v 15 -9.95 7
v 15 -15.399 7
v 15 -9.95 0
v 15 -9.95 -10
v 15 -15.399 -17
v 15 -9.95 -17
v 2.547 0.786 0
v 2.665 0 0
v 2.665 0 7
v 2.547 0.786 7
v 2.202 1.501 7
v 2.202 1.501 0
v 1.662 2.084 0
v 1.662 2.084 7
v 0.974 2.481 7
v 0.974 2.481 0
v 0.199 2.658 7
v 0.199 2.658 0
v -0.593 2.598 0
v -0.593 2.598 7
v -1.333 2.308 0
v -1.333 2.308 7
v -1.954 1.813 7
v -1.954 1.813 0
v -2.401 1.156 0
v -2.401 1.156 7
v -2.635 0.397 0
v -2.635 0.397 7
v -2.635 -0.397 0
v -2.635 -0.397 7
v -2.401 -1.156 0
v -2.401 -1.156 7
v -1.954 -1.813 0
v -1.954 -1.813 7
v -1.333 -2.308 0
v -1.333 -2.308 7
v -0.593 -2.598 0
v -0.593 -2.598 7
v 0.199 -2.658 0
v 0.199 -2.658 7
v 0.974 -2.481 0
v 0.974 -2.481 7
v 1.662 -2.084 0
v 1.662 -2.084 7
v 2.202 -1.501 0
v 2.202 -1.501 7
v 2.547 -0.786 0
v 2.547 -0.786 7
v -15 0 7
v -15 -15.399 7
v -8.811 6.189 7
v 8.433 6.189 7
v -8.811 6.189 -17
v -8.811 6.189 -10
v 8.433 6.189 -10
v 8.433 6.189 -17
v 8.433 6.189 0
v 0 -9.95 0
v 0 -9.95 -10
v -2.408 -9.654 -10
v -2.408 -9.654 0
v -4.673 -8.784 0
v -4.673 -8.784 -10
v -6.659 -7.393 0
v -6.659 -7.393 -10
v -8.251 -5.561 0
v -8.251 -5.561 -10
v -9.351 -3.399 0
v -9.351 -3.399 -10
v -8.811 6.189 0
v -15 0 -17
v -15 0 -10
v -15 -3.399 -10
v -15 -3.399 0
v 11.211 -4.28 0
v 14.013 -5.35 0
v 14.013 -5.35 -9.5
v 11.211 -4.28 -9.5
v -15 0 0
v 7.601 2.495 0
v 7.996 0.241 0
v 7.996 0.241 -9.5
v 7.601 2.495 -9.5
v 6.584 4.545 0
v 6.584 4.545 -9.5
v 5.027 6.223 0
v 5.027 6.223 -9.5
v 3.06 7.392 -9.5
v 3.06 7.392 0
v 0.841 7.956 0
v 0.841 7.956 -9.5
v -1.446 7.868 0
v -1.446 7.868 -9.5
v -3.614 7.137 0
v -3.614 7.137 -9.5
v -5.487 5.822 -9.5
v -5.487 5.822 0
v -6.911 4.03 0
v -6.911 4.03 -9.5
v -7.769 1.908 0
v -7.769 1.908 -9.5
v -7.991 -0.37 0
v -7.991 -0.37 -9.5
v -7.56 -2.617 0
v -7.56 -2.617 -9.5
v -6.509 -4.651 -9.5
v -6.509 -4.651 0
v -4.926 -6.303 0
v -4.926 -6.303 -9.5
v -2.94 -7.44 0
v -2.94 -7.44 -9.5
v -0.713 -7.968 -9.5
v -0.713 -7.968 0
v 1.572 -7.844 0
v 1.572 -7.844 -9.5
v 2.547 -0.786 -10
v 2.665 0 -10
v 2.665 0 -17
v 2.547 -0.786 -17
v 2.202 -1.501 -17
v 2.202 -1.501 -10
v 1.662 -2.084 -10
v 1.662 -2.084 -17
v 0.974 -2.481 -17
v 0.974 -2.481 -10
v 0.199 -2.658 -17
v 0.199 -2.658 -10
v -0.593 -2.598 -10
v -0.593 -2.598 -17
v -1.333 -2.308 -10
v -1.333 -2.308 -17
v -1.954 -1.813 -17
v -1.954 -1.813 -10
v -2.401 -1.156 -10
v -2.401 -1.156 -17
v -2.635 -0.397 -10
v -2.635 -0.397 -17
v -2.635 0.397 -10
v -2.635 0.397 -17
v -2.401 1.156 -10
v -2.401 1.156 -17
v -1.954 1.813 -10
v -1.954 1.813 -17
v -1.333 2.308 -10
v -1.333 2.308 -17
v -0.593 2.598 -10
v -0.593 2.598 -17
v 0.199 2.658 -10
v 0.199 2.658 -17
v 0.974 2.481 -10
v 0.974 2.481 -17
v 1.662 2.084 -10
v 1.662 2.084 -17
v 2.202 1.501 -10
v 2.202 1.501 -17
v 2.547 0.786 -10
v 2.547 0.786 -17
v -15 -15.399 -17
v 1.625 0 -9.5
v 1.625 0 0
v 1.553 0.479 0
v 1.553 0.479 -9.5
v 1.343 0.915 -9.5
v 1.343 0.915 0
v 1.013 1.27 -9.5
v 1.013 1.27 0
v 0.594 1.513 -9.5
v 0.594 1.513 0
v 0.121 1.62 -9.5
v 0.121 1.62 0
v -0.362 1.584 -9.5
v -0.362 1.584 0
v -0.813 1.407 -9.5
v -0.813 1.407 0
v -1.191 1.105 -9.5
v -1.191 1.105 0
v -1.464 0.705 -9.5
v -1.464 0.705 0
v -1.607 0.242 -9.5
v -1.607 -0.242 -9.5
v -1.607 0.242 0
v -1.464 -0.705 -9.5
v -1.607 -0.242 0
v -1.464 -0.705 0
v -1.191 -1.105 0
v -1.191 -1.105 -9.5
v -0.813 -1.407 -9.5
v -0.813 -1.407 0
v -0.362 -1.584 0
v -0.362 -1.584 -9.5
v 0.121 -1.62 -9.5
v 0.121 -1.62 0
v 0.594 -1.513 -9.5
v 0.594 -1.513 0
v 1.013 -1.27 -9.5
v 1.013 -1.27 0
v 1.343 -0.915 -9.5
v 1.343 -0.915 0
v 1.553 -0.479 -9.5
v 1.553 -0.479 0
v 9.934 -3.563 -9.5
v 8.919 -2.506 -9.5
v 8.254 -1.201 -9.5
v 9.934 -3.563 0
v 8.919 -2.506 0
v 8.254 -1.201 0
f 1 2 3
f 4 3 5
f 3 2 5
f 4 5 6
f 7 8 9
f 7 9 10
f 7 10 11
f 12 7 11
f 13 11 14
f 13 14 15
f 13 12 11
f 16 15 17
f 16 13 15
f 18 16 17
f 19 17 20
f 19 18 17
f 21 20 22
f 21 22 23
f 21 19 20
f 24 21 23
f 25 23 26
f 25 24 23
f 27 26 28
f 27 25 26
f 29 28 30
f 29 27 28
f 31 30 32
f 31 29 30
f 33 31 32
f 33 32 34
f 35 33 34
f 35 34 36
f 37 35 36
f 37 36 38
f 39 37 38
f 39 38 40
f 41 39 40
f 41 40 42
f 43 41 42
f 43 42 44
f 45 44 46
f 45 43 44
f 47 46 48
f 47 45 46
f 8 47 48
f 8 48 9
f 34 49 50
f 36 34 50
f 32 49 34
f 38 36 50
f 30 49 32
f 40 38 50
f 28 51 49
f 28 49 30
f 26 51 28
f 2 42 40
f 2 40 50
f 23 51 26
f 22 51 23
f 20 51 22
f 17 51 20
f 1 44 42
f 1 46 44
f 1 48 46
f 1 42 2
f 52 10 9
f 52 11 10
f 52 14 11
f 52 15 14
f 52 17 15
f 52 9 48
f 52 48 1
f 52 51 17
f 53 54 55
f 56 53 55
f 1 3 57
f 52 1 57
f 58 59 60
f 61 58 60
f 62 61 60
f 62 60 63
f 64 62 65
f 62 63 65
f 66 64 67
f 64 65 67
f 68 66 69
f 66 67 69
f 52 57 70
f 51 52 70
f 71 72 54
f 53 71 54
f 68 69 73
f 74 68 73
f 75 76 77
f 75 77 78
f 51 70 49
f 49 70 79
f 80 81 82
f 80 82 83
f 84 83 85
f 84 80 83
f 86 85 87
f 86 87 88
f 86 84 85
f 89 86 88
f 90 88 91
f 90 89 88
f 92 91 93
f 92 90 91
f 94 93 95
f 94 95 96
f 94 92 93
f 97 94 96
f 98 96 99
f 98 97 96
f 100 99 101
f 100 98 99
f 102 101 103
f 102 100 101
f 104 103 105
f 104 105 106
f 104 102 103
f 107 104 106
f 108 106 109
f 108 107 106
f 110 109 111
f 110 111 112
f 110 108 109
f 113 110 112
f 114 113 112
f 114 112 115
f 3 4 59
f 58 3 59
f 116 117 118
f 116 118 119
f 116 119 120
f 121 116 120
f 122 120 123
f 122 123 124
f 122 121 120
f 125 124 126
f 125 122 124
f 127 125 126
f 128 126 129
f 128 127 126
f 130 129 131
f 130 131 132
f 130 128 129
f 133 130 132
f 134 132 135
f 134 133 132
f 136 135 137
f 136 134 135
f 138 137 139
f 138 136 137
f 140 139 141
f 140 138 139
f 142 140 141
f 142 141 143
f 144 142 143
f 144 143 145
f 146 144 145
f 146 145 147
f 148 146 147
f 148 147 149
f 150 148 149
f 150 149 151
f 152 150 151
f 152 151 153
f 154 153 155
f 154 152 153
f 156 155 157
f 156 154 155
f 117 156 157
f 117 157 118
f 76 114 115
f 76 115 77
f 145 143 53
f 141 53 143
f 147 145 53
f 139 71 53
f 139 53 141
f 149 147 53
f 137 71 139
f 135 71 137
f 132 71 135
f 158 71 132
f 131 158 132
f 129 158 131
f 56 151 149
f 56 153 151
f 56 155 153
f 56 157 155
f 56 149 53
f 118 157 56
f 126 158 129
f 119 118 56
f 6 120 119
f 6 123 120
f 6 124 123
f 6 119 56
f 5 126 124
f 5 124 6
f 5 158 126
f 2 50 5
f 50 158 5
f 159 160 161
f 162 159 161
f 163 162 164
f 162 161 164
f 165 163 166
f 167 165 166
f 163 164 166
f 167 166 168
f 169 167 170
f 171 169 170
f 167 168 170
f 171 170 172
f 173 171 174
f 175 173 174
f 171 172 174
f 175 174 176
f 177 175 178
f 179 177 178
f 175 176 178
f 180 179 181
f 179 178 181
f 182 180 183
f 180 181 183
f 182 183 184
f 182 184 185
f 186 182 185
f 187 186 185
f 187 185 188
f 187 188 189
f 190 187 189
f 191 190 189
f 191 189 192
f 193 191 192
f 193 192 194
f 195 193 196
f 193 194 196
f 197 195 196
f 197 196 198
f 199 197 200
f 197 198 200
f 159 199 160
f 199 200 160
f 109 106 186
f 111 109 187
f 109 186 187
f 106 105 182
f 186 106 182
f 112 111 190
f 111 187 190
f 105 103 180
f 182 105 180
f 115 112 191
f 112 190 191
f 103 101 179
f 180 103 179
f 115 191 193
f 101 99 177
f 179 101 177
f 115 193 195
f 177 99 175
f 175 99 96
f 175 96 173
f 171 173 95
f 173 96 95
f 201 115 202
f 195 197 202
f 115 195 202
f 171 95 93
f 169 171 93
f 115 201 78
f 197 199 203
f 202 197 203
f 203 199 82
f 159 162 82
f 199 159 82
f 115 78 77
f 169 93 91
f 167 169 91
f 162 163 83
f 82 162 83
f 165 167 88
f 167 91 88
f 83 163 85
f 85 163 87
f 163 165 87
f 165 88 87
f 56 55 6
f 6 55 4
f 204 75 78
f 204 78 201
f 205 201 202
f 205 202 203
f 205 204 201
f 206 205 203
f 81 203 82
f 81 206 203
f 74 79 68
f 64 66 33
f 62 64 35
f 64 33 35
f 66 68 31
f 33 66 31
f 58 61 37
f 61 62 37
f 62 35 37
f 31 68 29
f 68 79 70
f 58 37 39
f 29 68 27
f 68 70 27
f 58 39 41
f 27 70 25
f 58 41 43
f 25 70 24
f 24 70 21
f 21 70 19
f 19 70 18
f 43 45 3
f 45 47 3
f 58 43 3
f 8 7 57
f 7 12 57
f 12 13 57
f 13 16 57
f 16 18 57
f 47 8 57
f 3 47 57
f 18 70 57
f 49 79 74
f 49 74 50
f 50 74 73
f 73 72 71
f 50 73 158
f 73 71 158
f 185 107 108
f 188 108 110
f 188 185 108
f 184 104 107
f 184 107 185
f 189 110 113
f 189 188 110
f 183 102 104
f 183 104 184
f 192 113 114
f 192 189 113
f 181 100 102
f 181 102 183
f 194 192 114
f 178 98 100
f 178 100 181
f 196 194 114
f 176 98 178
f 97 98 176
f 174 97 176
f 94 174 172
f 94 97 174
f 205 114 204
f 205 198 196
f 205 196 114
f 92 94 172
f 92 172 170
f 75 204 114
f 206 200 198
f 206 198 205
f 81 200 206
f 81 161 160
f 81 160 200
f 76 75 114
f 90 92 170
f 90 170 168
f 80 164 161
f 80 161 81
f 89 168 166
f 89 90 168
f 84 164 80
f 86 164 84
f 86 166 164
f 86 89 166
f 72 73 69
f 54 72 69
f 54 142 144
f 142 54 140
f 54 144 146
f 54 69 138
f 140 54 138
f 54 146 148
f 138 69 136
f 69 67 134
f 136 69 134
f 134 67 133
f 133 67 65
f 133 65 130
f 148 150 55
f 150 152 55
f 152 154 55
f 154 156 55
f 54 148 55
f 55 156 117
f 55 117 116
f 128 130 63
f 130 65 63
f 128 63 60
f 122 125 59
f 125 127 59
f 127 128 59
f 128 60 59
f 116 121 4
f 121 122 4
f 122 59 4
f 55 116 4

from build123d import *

# Parameters (mm, degrees)
F1_R      = 4.2
F1_R_2    = 2.665
F3_DEPTH  = 7
F5_R      = 2.665
F6_DEPTH  = 7
F2_R      = 1.625
F7_DEPTH  = 9.5
F10_DEPTH = 10


# Not quite as in the source:
# - the program builds the solid bodies; features that only make, move or delete a surface that nothing else refers to are left out


with BuildPart() as f3:
    # F1 (on Top) → F3 (new body)
    with BuildSketch(Plane.XY):
        Polygon((-8.8110024968, 6.1889975032), (-15, 0), (-15, -15.3994522989), (15, -15.3994522989), (15, -9.9498743711), (8.4334993606, 6.1889975032), align=None)
        Circle(F1_R, mode=Mode.SUBTRACT)
        Circle(F1_R)
        Circle(F1_R_2, mode=Mode.SUBTRACT)
    extrude(amount=F3_DEPTH)



with BuildPart() as f6:
    # F5 (on offset) → F6 (new body)
    with BuildSketch(Plane(origin=(0, 0, -10), x_dir=(1, 0, 0), z_dir=(0, 0, -1))):
        Polygon((-15, 0), (-8.8110024968, -6.1889975032), (8.4334993606, -6.1889975032), (15, 9.9498743711), (15, 15.3994522989), (-15, 15.3994522989), align=None)
        Circle(F5_R, mode=Mode.SUBTRACT)
    extrude(amount=F6_DEPTH)


with BuildPart() as f7:
    # F2 (on Top) → F7 (new body)
    with BuildSketch(Plane.XY):
        with BuildLine():
            Line((1.5724151216, -7.8439473918), (14.0134819596, -5.3499834923))
            Line((14.0134819596, -5.3499834923), (11.2107855677, -4.2799867939))
            ThreePointArc((11.2107855677, -4.2799867939), (8.919201221, -2.5062544394), (7.996377476, 0.240722375))
            ThreePointArc((7.996377476, 0.240722375), (-6.2634590486, 4.9768545033), (1.5724151216, -7.8439473918))
        make_face()
        Circle(F2_R, mode=Mode.SUBTRACT)
    extrude(amount=-F7_DEPTH)


with BuildPart() as f3_1:
    add(f3.part)

    add(f6.part)  # F10 merges F6
    # F9 (on face) → F10 (join, through all)
    with BuildSketch(Plane.XY.offset(-10)):
        with BuildLine():
            Line((-9.351134908, -3.3994522989), (-15, -3.3994522989))
            Line((-15, -3.3994522989), (-15, -15.3994522989))
            Line((-15, -15.3994522989), (15, -15.3994522989))
            Line((15, -15.3994522989), (15, -9.9498743711))
            Line((15, -9.9498743711), (0, -9.9498743711))
            ThreePointArc((0, -9.9498743711), (-5.7085846186, -8.1493595854), (-9.351134908, -3.3994522989))
        make_face()
    extrude(amount=F10_DEPTH)


solid = Compound([f7.part, f3_1.part])
